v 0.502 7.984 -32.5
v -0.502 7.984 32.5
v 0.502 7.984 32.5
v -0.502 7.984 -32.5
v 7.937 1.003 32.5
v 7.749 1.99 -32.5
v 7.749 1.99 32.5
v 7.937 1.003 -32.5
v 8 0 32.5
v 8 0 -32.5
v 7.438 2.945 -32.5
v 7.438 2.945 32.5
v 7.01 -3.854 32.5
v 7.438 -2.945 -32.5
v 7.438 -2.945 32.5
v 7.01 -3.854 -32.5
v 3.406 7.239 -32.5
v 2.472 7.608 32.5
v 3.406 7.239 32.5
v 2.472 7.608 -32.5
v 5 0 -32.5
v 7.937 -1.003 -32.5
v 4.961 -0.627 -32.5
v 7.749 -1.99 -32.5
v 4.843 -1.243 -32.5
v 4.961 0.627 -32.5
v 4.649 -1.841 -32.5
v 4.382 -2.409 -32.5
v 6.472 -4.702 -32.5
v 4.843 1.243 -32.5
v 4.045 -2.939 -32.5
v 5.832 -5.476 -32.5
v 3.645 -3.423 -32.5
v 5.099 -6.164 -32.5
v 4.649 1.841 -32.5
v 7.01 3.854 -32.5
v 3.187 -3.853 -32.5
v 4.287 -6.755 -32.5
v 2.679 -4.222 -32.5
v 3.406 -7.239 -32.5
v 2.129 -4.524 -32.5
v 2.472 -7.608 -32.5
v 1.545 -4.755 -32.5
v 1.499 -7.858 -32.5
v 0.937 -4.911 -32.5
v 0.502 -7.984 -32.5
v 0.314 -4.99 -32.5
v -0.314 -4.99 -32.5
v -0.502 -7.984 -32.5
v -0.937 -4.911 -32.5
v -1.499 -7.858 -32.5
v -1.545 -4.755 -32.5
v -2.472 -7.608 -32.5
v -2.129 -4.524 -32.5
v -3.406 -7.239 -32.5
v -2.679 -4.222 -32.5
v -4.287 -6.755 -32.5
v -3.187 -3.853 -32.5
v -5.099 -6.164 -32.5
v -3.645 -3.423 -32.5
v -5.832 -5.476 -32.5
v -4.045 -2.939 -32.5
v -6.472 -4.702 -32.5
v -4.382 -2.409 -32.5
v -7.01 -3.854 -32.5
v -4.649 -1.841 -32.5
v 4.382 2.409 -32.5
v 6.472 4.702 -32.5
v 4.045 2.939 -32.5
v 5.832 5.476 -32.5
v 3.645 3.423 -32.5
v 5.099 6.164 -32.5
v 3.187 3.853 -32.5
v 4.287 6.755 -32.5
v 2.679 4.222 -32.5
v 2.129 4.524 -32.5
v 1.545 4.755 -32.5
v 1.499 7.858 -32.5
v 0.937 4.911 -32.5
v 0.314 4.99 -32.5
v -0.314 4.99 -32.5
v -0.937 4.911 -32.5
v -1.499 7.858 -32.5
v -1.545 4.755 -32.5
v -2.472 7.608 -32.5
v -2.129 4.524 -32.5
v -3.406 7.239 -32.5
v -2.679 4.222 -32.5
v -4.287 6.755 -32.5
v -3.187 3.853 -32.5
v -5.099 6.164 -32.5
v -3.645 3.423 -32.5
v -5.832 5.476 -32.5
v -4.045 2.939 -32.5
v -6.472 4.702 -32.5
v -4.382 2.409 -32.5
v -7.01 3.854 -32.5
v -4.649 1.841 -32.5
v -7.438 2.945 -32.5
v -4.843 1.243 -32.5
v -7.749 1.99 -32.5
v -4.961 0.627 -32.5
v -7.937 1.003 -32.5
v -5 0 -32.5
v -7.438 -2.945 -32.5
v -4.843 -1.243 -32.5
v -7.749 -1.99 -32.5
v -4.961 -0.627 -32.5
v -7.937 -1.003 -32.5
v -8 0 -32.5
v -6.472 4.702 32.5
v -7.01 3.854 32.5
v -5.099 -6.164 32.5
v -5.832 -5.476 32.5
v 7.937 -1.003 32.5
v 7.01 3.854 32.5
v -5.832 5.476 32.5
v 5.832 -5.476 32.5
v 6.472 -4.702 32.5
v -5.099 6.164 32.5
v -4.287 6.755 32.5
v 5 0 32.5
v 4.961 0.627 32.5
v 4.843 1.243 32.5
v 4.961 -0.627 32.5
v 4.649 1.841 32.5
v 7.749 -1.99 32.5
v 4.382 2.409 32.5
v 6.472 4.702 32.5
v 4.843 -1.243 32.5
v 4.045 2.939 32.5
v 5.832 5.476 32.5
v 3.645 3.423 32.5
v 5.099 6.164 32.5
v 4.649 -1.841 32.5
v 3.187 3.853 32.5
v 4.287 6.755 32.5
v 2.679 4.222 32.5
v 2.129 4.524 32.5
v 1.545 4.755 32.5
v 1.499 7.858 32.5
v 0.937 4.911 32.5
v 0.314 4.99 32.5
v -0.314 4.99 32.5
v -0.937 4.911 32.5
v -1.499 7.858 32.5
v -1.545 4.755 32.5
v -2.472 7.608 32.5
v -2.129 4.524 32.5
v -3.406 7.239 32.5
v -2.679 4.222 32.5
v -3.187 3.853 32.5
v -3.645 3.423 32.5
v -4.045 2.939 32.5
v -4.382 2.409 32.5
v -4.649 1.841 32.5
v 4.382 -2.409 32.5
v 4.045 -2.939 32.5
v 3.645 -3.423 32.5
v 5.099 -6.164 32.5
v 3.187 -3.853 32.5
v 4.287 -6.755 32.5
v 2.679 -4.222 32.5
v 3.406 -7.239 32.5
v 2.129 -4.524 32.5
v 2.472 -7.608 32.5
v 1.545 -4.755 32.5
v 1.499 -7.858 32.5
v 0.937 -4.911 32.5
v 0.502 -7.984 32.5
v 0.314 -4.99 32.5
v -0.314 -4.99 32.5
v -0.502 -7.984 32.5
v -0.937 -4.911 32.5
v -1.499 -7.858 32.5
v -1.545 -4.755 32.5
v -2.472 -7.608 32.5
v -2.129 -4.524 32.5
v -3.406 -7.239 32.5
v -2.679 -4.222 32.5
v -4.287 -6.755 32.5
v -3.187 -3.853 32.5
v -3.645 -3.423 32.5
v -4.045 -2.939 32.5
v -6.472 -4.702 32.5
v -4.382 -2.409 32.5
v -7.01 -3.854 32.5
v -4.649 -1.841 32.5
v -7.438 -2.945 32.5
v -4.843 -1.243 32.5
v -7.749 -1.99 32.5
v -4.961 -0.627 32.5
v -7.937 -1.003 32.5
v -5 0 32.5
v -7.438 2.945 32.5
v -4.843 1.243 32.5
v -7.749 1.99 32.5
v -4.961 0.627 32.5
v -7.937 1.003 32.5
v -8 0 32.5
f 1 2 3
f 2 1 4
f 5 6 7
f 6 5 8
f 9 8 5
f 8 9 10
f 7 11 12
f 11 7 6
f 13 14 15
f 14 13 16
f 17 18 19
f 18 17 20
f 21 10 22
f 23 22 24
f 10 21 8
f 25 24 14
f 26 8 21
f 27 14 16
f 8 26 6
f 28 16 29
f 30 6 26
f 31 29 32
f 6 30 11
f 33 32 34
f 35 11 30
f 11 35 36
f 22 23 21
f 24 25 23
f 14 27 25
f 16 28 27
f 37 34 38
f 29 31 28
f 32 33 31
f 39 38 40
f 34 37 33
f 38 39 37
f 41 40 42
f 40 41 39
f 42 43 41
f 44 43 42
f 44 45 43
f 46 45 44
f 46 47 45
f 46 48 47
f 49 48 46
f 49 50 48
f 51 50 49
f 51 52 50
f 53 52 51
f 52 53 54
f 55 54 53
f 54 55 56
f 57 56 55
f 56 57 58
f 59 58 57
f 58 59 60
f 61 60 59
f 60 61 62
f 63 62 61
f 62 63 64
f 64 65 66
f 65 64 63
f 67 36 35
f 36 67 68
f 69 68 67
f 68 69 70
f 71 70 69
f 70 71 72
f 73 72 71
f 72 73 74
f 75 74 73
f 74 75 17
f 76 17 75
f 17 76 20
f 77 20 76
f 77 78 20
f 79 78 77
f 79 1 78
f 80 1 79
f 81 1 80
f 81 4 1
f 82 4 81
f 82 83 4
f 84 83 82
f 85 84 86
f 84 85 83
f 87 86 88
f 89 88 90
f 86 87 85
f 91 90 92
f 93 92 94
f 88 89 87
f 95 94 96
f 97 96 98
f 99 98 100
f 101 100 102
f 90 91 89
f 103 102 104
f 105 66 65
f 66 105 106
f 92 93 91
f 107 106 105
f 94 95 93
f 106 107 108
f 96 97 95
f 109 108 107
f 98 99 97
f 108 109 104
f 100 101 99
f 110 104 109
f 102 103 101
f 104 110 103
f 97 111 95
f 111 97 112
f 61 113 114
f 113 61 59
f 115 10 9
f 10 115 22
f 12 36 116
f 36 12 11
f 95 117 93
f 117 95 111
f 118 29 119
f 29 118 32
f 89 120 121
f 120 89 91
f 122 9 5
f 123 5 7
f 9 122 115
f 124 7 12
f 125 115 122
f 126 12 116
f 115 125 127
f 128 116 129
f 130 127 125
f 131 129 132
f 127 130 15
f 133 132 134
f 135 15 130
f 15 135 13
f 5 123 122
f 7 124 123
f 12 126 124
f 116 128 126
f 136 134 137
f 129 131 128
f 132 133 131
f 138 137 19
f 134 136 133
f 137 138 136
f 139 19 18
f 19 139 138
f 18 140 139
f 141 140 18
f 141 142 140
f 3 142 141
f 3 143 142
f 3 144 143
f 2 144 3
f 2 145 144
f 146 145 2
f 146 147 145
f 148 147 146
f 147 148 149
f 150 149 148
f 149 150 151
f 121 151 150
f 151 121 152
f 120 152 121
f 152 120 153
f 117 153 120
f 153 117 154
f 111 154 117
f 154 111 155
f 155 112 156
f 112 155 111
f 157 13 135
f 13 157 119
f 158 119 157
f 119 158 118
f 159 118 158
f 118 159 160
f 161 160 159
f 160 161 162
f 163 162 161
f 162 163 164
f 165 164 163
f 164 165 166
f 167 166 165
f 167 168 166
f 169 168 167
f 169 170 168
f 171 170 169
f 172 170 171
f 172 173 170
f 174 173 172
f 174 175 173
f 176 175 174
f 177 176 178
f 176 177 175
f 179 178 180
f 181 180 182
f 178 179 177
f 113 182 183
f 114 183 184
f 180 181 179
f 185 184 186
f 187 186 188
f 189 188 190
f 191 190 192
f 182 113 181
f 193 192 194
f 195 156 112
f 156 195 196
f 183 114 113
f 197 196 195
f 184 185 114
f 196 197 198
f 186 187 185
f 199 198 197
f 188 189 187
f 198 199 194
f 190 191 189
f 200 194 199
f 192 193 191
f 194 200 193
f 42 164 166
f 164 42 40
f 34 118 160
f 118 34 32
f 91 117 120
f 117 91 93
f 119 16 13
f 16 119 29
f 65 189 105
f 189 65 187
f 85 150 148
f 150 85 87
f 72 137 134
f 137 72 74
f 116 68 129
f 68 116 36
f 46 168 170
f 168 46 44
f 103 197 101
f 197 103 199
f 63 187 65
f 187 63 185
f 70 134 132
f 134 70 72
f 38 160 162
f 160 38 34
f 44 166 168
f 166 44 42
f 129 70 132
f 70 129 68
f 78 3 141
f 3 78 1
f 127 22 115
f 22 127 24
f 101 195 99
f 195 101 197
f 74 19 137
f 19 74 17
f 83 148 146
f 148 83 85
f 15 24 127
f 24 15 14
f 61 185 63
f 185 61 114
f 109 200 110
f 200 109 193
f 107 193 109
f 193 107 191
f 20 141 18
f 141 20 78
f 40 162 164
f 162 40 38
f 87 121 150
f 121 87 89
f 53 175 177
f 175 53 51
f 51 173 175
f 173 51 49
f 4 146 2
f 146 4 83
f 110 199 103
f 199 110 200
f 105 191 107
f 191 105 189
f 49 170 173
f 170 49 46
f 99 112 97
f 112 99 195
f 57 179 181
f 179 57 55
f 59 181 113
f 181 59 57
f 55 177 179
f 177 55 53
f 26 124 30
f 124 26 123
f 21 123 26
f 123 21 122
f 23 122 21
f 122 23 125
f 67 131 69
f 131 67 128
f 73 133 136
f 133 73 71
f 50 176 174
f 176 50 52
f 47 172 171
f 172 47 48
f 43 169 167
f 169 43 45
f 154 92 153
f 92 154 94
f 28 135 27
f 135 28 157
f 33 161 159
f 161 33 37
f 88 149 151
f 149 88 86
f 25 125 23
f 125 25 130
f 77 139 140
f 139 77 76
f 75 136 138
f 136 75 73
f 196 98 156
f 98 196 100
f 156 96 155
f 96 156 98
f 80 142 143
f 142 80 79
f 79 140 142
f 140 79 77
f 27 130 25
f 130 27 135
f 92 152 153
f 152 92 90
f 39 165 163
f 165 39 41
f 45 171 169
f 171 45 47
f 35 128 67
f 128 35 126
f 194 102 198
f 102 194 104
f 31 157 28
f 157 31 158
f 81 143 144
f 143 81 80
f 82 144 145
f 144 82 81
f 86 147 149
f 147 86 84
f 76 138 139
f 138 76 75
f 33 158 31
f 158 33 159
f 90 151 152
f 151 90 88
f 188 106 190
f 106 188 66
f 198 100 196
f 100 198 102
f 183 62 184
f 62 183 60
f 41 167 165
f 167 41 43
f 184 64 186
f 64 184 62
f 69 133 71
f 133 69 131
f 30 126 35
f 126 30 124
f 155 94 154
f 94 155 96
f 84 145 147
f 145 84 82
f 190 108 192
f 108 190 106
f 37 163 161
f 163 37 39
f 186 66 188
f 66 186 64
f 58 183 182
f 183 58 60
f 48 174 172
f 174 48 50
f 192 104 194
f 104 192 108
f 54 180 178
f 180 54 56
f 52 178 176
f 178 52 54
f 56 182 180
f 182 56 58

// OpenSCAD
$fn = 50;


difference() {
	union() {
		translate(v = [0, 0, -32.5000000000]) {
			cylinder(h = 65, r = 8.0000000000);
		}
	}
	union() {
		translate(v = [0, 0, -100.0000000000]) {
			cylinder(h = 200, r = 5.0000000000);
		}
	}
}
